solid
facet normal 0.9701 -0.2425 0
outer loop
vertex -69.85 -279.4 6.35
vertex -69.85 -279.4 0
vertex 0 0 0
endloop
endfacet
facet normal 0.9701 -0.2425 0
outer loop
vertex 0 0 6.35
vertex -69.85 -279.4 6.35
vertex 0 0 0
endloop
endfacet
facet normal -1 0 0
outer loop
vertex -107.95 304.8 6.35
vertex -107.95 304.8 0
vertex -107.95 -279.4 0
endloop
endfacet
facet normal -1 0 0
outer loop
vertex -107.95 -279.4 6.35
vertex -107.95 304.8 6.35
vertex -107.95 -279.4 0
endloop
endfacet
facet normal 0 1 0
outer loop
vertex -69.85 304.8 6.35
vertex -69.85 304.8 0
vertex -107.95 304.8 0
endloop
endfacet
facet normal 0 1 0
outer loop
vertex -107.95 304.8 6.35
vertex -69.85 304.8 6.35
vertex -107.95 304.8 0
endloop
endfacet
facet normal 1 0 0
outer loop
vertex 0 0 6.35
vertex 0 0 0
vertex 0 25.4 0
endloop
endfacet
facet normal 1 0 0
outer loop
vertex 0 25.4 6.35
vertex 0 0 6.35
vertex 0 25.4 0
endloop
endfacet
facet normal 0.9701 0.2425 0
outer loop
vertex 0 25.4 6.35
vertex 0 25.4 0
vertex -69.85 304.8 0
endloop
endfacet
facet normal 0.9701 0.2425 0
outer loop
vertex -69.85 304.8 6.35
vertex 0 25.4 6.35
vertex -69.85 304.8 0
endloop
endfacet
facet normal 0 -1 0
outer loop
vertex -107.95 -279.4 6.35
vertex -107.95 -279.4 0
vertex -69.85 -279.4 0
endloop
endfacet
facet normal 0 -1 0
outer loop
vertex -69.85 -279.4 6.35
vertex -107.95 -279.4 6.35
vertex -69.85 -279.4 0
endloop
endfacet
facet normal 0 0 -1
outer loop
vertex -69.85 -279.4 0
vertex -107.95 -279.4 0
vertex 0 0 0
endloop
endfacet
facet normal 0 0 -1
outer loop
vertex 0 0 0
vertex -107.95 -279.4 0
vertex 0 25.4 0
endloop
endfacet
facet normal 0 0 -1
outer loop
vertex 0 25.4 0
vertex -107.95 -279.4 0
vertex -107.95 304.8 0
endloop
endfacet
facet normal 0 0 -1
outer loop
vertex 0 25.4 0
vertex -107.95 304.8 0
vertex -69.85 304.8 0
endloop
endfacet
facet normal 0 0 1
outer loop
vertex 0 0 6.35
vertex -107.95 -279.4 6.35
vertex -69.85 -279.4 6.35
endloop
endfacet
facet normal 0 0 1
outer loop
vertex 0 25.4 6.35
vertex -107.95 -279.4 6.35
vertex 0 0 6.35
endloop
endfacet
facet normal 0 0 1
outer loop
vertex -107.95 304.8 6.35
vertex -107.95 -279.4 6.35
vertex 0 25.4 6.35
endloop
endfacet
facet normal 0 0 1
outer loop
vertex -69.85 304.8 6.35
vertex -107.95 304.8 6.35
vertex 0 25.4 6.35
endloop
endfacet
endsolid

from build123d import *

# Parameters (mm, degrees)
F0_W     = 107.95
F0_H     = 12.7
F1_DEPTH = 6.35


with BuildPart() as f1:
    # F0 (on Top) → F1 (new body)
    with BuildSketch(Plane.XY):
        Polygon((-69.85, -279.4), (0, 0), (-107.95, 0), (-107.95, -279.4), align=None)
        Polygon((-107.95, 25.4), (0, 25.4), (-69.85, 304.8), (-107.95, 304.8), align=None)
        with Locations((-53.975, 19.05)):
            Rectangle(F0_W, F0_H)
        with Locations((-53.975, 6.35)):
            Rectangle(F0_W, F0_H)
    extrude(amount=F1_DEPTH)


solid = f1.part
